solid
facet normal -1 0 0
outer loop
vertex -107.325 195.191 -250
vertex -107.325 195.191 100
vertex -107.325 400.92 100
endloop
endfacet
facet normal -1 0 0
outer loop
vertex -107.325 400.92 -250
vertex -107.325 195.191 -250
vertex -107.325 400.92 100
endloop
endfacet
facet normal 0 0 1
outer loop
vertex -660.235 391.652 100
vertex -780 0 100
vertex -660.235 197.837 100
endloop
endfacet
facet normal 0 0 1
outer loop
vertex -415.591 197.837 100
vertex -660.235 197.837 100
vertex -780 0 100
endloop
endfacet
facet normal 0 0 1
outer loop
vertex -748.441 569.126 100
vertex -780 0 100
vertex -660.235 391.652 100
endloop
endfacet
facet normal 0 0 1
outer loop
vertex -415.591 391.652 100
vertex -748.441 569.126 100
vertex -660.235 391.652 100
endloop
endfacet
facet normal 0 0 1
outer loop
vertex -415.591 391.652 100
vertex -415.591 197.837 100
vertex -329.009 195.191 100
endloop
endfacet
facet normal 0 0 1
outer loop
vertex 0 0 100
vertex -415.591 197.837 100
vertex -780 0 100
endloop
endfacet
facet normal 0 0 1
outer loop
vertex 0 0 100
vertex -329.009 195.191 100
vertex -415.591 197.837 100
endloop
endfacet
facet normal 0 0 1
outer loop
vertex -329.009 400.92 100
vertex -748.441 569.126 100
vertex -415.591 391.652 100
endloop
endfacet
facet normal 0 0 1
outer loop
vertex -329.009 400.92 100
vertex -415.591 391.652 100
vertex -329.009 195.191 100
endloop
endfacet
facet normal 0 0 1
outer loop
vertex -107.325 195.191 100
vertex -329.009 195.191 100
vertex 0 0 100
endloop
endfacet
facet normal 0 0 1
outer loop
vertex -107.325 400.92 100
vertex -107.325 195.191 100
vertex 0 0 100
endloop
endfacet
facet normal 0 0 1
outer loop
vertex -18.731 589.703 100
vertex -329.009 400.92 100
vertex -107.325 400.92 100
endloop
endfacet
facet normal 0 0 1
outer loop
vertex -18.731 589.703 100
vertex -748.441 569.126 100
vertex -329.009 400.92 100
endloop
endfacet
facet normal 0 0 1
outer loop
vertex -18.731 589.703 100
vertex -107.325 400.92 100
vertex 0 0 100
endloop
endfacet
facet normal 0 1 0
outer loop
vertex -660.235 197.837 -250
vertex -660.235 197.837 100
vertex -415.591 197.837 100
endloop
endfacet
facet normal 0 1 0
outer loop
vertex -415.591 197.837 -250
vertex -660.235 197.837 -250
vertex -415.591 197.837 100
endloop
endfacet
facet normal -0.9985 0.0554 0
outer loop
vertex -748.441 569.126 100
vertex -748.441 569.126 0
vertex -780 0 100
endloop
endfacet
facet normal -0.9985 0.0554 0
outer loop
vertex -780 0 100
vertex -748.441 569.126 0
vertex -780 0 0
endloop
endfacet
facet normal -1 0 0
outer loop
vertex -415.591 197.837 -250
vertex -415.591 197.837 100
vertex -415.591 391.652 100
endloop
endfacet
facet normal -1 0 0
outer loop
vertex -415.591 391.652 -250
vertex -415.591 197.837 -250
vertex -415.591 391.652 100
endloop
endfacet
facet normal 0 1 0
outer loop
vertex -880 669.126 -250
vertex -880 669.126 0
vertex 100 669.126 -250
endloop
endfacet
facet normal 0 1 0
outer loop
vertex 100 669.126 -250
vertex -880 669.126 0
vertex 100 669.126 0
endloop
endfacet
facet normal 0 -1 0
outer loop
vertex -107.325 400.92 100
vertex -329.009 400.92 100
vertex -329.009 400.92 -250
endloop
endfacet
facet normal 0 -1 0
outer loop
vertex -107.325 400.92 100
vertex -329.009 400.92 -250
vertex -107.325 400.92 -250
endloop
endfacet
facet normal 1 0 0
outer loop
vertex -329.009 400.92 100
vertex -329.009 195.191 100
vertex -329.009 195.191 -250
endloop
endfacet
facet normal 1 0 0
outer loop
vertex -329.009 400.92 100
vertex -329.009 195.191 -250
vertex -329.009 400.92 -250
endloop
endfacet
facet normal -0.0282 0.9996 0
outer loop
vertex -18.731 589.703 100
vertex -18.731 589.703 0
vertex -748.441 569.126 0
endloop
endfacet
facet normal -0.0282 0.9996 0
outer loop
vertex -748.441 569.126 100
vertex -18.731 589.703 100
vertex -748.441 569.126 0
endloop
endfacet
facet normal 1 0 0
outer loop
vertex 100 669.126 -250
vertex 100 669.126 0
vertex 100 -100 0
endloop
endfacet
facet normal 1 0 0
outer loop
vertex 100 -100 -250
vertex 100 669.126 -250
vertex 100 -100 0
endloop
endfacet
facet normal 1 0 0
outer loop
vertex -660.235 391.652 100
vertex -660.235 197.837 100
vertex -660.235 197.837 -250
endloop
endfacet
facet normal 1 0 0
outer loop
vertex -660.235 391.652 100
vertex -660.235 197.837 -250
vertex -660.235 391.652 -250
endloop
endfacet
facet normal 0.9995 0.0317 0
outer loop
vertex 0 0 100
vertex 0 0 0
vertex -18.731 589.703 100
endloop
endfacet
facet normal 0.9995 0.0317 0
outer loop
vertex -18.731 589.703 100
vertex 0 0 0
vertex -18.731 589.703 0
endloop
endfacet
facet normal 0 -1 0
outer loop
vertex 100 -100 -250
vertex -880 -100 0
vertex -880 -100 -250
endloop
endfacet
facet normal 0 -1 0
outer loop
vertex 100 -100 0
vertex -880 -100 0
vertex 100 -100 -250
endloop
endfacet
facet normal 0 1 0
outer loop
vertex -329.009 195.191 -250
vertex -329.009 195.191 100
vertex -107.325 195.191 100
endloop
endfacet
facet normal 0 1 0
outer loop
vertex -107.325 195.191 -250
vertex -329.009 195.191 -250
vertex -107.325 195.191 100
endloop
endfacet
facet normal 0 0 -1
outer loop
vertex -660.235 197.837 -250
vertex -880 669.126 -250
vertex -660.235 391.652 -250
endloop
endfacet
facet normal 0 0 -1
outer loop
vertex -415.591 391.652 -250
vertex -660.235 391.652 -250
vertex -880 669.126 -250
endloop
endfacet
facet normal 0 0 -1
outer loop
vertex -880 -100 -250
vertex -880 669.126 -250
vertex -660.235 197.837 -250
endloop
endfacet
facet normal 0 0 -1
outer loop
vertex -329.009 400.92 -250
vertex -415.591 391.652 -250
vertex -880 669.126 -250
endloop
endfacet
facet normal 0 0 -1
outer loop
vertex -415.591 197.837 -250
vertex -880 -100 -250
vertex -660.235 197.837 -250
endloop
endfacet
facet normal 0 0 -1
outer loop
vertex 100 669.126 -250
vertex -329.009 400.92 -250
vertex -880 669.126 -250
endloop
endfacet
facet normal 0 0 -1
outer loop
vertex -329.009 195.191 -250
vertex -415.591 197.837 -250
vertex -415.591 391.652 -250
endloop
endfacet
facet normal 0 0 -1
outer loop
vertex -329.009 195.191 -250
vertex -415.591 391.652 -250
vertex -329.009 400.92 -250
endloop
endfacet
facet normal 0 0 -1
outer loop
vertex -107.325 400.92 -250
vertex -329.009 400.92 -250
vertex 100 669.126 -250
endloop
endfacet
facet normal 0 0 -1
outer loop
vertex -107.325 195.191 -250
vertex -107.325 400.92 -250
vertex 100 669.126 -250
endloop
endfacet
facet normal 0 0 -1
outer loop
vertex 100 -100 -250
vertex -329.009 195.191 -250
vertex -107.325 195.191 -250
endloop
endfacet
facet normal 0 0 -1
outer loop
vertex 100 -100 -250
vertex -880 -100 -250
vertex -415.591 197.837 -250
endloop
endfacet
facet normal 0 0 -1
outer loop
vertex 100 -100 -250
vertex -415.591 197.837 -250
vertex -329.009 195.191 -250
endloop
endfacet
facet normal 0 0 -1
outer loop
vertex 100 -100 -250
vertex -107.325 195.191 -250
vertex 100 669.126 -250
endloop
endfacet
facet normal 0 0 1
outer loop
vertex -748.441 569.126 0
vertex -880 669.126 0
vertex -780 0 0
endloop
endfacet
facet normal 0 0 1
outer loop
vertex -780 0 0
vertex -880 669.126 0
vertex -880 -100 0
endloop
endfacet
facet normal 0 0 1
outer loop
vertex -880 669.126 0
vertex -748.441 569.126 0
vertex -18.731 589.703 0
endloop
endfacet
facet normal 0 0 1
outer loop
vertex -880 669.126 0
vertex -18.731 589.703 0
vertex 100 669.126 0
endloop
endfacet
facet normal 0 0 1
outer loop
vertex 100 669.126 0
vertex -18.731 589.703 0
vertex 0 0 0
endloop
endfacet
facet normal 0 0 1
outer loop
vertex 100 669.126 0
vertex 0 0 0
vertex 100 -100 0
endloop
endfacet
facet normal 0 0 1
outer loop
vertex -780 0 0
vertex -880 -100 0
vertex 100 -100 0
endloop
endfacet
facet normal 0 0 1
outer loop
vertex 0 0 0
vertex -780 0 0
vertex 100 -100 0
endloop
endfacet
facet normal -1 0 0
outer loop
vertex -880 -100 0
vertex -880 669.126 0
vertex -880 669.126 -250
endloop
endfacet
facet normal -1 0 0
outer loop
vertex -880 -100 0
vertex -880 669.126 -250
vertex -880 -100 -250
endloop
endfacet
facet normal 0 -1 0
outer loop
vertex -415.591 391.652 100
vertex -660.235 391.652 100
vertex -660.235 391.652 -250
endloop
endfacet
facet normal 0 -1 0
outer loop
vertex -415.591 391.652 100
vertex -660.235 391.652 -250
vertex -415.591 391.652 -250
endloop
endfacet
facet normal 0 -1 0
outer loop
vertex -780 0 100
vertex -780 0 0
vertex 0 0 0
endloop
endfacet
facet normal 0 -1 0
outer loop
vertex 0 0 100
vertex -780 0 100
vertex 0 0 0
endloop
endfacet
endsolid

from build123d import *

# Parameters (mm, degrees)
F1_DEPTH = 100
F2_W     = 980
F2_H     = 769.125695
F3_DEPTH = 250
F4_W     = 244.644434
F4_H     = 193.814576
F4_W_2   = 221.683964
F4_H_2   = 205.729261
F5_DEPTH = 600


with BuildPart() as f1:
    # F0 (on Top) → F1 (new body)
    with BuildSketch(Plane.XY):
        Polygon((-780, 0), (0, 0), (-18.731487, 589.702579), (-748.441424, 569.125695), align=None)
    extrude(amount=F1_DEPTH)

    # F2 (on face) → F3 (join)
    with BuildSketch(Plane(origin=(0, 0, 0), x_dir=(1, 0, 0), z_dir=(0, 0, -1))):
        with Locations((-390, -284.562847)):
            Rectangle(F2_W, F2_H)
    extrude(amount=F3_DEPTH)

    # F4 (on face) → F5 (cut)
    with BuildSketch(Plane.XY.offset(100)):
        with Locations((-537.912771, 294.744283)):
            Rectangle(F4_W, F4_H)
        with Locations((-218.167432, 298.055314)):
            Rectangle(F4_W_2, F4_H_2)
    extrude(amount=-F5_DEPTH, mode=Mode.SUBTRACT)


solid = f1.part
